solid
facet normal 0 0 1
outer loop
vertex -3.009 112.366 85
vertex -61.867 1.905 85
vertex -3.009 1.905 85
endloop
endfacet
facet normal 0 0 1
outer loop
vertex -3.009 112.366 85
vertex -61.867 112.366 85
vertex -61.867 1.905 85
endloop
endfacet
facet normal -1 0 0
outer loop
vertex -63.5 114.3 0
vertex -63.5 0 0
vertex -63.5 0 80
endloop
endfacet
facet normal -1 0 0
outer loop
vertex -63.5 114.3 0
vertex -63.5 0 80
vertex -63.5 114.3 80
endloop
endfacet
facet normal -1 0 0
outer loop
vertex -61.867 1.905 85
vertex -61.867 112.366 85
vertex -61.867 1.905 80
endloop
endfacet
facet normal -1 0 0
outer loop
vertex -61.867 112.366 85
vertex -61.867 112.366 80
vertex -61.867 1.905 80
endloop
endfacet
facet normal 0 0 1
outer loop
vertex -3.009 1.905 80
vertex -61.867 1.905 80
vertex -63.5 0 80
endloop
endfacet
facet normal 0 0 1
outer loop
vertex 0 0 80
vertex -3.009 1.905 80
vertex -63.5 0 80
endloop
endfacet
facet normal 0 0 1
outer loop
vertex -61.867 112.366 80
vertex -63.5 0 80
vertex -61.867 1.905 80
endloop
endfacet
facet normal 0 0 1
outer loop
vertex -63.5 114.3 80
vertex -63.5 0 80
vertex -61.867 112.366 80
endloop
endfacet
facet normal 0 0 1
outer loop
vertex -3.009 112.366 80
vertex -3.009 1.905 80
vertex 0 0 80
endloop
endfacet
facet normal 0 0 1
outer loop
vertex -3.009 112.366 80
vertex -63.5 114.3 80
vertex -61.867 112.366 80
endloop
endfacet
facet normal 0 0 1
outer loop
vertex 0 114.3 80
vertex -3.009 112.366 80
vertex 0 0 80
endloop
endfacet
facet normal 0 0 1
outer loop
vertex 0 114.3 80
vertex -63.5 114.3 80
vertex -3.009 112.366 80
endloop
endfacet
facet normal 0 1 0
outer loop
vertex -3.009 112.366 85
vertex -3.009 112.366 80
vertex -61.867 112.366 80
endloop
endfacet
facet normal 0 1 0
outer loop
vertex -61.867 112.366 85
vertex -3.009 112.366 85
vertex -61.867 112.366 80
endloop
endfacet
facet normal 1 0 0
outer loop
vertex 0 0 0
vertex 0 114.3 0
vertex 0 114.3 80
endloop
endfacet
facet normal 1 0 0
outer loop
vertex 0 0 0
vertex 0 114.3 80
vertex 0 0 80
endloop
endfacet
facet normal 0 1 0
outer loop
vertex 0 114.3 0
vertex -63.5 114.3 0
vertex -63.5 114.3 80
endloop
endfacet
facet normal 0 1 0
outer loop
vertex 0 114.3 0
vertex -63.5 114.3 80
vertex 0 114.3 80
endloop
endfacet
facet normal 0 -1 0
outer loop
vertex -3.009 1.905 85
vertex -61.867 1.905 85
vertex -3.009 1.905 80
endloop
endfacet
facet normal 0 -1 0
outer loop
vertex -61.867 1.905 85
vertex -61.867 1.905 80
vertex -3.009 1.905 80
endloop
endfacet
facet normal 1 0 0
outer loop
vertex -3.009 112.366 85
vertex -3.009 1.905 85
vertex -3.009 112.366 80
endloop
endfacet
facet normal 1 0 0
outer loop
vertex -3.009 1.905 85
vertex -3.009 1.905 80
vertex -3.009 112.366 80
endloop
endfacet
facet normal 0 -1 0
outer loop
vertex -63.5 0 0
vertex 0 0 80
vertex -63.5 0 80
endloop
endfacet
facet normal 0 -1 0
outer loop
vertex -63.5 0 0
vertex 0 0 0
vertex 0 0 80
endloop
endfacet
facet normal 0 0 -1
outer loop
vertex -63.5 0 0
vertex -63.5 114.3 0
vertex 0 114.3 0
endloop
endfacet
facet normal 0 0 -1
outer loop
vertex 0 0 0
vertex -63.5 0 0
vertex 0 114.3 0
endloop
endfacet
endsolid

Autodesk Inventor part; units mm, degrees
ref_plane "YZ Plane" through (0, 0, 0) normal (1, 0, 0) x (0, 1, 0)
ref_plane "XZ Plane" through (0, 0, 0) normal (0, 1, 0) x (-1, 0, 0)
ref_plane "XY Plane" through (0, 0, 0) normal (0, 0, 1) x (1, 0, 0)
sketch "Sketch1" plane through (0, 0, 0) normal (0, 0, 1) x (1, 0, 0)
  line L0 (0, 0) -> (-63.5, 0)
  line L1 (-63.5, 0) -> (-63.5, 114.3)
  line L2 (-63.5, 114.3) -> (0, 114.3)
  line L3 (0, 114.3) -> (0, 0)
  dimension "d0" = 63.5
  dimension "d1" = 114.3
extrude "Extrusion1" add sketch "Sketch1" along normal blind 85
sketch "Sketch2" plane through (0, 0, 85) normal (0, 0, 1) x (1, 0, 0)
  line L0 (0, 114.3) -> (-63.5, 114.3) projected
  line L1 (-63.5, 114.3) -> (-63.5, 0) projected
  line L2 (0, 114.3) -> (-63.5, 114.3)
  line L3 (-63.5, 114.3) -> (-63.5, 0)
  line L4 (-63.5, 0) -> (0, 0)
  line L5 (0, 0) -> (0, 114.3)
  point P0 (0, 0)
extrude "Extrusion2" cut sketch "Sketch2" against normal blind 5
sketch "Sketch3" plane through (0, 0, 80) normal (0, 0, 1) x (1, 0, 0)
  line L0 (-3.0089, 112.3665) -> (-61.8666, 112.3665)
  line L1 (-61.8666, 112.3665) -> (-61.8666, 1.9046)
  line L2 (-61.8666, 1.9046) -> (-3.0089, 1.9046)
  line L3 (-3.0089, 1.9046) -> (-3.0089, 112.3665)
  point P0 (0, 0)
extrude "Extrusion3" add sketch "Sketch3" along normal blind 5
properties part number "battery" material "LCP Plastic"
